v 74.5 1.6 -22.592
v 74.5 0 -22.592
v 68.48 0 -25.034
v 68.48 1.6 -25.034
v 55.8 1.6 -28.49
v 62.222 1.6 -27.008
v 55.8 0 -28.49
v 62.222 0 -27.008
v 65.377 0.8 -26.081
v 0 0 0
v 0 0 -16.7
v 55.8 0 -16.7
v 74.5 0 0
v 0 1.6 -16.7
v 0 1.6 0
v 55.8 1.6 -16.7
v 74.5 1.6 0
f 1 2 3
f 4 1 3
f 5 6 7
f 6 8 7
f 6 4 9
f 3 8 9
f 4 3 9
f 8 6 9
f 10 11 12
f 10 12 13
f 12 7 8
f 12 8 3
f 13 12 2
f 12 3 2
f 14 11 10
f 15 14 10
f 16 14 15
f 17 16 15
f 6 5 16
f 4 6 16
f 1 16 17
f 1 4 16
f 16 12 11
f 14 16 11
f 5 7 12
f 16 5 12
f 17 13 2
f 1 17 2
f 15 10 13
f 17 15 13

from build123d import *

# Parameters (mm, degrees)
BOSS_EXTRUDE1_DEPTH = 1.6


with BuildPart() as part:
    # Sketch1 → Boss-Extrude1 (new body)
    with BuildSketch(Plane(origin=(0, 0, 0), x_dir=(1, 0, 0), z_dir=(0, 1, 0))):
        with BuildLine():
            Line((0, 0), (74.5, 0))
            Line((74.5, 0), (74.5, 22.592093752))
            add(Edge.make_bspline(
                [(74.5, 22.592093752), (65.605442008, 26.625691322), (55.8, 28.490050428)],
                knots=[4.23030835, 4.23030835, 4.23030835, 4.496423735, 4.496423735, 4.496423735], degree=2, weights=[1, 0.991160878, 1]))
            Line((55.8, 28.490050428), (55.8, 16.7))
            Line((55.8, 16.7), (0, 16.7))
            Line((0, 16.7), (0, 0))
        make_face()
    extrude(amount=BOSS_EXTRUDE1_DEPTH)


solid = part.part
